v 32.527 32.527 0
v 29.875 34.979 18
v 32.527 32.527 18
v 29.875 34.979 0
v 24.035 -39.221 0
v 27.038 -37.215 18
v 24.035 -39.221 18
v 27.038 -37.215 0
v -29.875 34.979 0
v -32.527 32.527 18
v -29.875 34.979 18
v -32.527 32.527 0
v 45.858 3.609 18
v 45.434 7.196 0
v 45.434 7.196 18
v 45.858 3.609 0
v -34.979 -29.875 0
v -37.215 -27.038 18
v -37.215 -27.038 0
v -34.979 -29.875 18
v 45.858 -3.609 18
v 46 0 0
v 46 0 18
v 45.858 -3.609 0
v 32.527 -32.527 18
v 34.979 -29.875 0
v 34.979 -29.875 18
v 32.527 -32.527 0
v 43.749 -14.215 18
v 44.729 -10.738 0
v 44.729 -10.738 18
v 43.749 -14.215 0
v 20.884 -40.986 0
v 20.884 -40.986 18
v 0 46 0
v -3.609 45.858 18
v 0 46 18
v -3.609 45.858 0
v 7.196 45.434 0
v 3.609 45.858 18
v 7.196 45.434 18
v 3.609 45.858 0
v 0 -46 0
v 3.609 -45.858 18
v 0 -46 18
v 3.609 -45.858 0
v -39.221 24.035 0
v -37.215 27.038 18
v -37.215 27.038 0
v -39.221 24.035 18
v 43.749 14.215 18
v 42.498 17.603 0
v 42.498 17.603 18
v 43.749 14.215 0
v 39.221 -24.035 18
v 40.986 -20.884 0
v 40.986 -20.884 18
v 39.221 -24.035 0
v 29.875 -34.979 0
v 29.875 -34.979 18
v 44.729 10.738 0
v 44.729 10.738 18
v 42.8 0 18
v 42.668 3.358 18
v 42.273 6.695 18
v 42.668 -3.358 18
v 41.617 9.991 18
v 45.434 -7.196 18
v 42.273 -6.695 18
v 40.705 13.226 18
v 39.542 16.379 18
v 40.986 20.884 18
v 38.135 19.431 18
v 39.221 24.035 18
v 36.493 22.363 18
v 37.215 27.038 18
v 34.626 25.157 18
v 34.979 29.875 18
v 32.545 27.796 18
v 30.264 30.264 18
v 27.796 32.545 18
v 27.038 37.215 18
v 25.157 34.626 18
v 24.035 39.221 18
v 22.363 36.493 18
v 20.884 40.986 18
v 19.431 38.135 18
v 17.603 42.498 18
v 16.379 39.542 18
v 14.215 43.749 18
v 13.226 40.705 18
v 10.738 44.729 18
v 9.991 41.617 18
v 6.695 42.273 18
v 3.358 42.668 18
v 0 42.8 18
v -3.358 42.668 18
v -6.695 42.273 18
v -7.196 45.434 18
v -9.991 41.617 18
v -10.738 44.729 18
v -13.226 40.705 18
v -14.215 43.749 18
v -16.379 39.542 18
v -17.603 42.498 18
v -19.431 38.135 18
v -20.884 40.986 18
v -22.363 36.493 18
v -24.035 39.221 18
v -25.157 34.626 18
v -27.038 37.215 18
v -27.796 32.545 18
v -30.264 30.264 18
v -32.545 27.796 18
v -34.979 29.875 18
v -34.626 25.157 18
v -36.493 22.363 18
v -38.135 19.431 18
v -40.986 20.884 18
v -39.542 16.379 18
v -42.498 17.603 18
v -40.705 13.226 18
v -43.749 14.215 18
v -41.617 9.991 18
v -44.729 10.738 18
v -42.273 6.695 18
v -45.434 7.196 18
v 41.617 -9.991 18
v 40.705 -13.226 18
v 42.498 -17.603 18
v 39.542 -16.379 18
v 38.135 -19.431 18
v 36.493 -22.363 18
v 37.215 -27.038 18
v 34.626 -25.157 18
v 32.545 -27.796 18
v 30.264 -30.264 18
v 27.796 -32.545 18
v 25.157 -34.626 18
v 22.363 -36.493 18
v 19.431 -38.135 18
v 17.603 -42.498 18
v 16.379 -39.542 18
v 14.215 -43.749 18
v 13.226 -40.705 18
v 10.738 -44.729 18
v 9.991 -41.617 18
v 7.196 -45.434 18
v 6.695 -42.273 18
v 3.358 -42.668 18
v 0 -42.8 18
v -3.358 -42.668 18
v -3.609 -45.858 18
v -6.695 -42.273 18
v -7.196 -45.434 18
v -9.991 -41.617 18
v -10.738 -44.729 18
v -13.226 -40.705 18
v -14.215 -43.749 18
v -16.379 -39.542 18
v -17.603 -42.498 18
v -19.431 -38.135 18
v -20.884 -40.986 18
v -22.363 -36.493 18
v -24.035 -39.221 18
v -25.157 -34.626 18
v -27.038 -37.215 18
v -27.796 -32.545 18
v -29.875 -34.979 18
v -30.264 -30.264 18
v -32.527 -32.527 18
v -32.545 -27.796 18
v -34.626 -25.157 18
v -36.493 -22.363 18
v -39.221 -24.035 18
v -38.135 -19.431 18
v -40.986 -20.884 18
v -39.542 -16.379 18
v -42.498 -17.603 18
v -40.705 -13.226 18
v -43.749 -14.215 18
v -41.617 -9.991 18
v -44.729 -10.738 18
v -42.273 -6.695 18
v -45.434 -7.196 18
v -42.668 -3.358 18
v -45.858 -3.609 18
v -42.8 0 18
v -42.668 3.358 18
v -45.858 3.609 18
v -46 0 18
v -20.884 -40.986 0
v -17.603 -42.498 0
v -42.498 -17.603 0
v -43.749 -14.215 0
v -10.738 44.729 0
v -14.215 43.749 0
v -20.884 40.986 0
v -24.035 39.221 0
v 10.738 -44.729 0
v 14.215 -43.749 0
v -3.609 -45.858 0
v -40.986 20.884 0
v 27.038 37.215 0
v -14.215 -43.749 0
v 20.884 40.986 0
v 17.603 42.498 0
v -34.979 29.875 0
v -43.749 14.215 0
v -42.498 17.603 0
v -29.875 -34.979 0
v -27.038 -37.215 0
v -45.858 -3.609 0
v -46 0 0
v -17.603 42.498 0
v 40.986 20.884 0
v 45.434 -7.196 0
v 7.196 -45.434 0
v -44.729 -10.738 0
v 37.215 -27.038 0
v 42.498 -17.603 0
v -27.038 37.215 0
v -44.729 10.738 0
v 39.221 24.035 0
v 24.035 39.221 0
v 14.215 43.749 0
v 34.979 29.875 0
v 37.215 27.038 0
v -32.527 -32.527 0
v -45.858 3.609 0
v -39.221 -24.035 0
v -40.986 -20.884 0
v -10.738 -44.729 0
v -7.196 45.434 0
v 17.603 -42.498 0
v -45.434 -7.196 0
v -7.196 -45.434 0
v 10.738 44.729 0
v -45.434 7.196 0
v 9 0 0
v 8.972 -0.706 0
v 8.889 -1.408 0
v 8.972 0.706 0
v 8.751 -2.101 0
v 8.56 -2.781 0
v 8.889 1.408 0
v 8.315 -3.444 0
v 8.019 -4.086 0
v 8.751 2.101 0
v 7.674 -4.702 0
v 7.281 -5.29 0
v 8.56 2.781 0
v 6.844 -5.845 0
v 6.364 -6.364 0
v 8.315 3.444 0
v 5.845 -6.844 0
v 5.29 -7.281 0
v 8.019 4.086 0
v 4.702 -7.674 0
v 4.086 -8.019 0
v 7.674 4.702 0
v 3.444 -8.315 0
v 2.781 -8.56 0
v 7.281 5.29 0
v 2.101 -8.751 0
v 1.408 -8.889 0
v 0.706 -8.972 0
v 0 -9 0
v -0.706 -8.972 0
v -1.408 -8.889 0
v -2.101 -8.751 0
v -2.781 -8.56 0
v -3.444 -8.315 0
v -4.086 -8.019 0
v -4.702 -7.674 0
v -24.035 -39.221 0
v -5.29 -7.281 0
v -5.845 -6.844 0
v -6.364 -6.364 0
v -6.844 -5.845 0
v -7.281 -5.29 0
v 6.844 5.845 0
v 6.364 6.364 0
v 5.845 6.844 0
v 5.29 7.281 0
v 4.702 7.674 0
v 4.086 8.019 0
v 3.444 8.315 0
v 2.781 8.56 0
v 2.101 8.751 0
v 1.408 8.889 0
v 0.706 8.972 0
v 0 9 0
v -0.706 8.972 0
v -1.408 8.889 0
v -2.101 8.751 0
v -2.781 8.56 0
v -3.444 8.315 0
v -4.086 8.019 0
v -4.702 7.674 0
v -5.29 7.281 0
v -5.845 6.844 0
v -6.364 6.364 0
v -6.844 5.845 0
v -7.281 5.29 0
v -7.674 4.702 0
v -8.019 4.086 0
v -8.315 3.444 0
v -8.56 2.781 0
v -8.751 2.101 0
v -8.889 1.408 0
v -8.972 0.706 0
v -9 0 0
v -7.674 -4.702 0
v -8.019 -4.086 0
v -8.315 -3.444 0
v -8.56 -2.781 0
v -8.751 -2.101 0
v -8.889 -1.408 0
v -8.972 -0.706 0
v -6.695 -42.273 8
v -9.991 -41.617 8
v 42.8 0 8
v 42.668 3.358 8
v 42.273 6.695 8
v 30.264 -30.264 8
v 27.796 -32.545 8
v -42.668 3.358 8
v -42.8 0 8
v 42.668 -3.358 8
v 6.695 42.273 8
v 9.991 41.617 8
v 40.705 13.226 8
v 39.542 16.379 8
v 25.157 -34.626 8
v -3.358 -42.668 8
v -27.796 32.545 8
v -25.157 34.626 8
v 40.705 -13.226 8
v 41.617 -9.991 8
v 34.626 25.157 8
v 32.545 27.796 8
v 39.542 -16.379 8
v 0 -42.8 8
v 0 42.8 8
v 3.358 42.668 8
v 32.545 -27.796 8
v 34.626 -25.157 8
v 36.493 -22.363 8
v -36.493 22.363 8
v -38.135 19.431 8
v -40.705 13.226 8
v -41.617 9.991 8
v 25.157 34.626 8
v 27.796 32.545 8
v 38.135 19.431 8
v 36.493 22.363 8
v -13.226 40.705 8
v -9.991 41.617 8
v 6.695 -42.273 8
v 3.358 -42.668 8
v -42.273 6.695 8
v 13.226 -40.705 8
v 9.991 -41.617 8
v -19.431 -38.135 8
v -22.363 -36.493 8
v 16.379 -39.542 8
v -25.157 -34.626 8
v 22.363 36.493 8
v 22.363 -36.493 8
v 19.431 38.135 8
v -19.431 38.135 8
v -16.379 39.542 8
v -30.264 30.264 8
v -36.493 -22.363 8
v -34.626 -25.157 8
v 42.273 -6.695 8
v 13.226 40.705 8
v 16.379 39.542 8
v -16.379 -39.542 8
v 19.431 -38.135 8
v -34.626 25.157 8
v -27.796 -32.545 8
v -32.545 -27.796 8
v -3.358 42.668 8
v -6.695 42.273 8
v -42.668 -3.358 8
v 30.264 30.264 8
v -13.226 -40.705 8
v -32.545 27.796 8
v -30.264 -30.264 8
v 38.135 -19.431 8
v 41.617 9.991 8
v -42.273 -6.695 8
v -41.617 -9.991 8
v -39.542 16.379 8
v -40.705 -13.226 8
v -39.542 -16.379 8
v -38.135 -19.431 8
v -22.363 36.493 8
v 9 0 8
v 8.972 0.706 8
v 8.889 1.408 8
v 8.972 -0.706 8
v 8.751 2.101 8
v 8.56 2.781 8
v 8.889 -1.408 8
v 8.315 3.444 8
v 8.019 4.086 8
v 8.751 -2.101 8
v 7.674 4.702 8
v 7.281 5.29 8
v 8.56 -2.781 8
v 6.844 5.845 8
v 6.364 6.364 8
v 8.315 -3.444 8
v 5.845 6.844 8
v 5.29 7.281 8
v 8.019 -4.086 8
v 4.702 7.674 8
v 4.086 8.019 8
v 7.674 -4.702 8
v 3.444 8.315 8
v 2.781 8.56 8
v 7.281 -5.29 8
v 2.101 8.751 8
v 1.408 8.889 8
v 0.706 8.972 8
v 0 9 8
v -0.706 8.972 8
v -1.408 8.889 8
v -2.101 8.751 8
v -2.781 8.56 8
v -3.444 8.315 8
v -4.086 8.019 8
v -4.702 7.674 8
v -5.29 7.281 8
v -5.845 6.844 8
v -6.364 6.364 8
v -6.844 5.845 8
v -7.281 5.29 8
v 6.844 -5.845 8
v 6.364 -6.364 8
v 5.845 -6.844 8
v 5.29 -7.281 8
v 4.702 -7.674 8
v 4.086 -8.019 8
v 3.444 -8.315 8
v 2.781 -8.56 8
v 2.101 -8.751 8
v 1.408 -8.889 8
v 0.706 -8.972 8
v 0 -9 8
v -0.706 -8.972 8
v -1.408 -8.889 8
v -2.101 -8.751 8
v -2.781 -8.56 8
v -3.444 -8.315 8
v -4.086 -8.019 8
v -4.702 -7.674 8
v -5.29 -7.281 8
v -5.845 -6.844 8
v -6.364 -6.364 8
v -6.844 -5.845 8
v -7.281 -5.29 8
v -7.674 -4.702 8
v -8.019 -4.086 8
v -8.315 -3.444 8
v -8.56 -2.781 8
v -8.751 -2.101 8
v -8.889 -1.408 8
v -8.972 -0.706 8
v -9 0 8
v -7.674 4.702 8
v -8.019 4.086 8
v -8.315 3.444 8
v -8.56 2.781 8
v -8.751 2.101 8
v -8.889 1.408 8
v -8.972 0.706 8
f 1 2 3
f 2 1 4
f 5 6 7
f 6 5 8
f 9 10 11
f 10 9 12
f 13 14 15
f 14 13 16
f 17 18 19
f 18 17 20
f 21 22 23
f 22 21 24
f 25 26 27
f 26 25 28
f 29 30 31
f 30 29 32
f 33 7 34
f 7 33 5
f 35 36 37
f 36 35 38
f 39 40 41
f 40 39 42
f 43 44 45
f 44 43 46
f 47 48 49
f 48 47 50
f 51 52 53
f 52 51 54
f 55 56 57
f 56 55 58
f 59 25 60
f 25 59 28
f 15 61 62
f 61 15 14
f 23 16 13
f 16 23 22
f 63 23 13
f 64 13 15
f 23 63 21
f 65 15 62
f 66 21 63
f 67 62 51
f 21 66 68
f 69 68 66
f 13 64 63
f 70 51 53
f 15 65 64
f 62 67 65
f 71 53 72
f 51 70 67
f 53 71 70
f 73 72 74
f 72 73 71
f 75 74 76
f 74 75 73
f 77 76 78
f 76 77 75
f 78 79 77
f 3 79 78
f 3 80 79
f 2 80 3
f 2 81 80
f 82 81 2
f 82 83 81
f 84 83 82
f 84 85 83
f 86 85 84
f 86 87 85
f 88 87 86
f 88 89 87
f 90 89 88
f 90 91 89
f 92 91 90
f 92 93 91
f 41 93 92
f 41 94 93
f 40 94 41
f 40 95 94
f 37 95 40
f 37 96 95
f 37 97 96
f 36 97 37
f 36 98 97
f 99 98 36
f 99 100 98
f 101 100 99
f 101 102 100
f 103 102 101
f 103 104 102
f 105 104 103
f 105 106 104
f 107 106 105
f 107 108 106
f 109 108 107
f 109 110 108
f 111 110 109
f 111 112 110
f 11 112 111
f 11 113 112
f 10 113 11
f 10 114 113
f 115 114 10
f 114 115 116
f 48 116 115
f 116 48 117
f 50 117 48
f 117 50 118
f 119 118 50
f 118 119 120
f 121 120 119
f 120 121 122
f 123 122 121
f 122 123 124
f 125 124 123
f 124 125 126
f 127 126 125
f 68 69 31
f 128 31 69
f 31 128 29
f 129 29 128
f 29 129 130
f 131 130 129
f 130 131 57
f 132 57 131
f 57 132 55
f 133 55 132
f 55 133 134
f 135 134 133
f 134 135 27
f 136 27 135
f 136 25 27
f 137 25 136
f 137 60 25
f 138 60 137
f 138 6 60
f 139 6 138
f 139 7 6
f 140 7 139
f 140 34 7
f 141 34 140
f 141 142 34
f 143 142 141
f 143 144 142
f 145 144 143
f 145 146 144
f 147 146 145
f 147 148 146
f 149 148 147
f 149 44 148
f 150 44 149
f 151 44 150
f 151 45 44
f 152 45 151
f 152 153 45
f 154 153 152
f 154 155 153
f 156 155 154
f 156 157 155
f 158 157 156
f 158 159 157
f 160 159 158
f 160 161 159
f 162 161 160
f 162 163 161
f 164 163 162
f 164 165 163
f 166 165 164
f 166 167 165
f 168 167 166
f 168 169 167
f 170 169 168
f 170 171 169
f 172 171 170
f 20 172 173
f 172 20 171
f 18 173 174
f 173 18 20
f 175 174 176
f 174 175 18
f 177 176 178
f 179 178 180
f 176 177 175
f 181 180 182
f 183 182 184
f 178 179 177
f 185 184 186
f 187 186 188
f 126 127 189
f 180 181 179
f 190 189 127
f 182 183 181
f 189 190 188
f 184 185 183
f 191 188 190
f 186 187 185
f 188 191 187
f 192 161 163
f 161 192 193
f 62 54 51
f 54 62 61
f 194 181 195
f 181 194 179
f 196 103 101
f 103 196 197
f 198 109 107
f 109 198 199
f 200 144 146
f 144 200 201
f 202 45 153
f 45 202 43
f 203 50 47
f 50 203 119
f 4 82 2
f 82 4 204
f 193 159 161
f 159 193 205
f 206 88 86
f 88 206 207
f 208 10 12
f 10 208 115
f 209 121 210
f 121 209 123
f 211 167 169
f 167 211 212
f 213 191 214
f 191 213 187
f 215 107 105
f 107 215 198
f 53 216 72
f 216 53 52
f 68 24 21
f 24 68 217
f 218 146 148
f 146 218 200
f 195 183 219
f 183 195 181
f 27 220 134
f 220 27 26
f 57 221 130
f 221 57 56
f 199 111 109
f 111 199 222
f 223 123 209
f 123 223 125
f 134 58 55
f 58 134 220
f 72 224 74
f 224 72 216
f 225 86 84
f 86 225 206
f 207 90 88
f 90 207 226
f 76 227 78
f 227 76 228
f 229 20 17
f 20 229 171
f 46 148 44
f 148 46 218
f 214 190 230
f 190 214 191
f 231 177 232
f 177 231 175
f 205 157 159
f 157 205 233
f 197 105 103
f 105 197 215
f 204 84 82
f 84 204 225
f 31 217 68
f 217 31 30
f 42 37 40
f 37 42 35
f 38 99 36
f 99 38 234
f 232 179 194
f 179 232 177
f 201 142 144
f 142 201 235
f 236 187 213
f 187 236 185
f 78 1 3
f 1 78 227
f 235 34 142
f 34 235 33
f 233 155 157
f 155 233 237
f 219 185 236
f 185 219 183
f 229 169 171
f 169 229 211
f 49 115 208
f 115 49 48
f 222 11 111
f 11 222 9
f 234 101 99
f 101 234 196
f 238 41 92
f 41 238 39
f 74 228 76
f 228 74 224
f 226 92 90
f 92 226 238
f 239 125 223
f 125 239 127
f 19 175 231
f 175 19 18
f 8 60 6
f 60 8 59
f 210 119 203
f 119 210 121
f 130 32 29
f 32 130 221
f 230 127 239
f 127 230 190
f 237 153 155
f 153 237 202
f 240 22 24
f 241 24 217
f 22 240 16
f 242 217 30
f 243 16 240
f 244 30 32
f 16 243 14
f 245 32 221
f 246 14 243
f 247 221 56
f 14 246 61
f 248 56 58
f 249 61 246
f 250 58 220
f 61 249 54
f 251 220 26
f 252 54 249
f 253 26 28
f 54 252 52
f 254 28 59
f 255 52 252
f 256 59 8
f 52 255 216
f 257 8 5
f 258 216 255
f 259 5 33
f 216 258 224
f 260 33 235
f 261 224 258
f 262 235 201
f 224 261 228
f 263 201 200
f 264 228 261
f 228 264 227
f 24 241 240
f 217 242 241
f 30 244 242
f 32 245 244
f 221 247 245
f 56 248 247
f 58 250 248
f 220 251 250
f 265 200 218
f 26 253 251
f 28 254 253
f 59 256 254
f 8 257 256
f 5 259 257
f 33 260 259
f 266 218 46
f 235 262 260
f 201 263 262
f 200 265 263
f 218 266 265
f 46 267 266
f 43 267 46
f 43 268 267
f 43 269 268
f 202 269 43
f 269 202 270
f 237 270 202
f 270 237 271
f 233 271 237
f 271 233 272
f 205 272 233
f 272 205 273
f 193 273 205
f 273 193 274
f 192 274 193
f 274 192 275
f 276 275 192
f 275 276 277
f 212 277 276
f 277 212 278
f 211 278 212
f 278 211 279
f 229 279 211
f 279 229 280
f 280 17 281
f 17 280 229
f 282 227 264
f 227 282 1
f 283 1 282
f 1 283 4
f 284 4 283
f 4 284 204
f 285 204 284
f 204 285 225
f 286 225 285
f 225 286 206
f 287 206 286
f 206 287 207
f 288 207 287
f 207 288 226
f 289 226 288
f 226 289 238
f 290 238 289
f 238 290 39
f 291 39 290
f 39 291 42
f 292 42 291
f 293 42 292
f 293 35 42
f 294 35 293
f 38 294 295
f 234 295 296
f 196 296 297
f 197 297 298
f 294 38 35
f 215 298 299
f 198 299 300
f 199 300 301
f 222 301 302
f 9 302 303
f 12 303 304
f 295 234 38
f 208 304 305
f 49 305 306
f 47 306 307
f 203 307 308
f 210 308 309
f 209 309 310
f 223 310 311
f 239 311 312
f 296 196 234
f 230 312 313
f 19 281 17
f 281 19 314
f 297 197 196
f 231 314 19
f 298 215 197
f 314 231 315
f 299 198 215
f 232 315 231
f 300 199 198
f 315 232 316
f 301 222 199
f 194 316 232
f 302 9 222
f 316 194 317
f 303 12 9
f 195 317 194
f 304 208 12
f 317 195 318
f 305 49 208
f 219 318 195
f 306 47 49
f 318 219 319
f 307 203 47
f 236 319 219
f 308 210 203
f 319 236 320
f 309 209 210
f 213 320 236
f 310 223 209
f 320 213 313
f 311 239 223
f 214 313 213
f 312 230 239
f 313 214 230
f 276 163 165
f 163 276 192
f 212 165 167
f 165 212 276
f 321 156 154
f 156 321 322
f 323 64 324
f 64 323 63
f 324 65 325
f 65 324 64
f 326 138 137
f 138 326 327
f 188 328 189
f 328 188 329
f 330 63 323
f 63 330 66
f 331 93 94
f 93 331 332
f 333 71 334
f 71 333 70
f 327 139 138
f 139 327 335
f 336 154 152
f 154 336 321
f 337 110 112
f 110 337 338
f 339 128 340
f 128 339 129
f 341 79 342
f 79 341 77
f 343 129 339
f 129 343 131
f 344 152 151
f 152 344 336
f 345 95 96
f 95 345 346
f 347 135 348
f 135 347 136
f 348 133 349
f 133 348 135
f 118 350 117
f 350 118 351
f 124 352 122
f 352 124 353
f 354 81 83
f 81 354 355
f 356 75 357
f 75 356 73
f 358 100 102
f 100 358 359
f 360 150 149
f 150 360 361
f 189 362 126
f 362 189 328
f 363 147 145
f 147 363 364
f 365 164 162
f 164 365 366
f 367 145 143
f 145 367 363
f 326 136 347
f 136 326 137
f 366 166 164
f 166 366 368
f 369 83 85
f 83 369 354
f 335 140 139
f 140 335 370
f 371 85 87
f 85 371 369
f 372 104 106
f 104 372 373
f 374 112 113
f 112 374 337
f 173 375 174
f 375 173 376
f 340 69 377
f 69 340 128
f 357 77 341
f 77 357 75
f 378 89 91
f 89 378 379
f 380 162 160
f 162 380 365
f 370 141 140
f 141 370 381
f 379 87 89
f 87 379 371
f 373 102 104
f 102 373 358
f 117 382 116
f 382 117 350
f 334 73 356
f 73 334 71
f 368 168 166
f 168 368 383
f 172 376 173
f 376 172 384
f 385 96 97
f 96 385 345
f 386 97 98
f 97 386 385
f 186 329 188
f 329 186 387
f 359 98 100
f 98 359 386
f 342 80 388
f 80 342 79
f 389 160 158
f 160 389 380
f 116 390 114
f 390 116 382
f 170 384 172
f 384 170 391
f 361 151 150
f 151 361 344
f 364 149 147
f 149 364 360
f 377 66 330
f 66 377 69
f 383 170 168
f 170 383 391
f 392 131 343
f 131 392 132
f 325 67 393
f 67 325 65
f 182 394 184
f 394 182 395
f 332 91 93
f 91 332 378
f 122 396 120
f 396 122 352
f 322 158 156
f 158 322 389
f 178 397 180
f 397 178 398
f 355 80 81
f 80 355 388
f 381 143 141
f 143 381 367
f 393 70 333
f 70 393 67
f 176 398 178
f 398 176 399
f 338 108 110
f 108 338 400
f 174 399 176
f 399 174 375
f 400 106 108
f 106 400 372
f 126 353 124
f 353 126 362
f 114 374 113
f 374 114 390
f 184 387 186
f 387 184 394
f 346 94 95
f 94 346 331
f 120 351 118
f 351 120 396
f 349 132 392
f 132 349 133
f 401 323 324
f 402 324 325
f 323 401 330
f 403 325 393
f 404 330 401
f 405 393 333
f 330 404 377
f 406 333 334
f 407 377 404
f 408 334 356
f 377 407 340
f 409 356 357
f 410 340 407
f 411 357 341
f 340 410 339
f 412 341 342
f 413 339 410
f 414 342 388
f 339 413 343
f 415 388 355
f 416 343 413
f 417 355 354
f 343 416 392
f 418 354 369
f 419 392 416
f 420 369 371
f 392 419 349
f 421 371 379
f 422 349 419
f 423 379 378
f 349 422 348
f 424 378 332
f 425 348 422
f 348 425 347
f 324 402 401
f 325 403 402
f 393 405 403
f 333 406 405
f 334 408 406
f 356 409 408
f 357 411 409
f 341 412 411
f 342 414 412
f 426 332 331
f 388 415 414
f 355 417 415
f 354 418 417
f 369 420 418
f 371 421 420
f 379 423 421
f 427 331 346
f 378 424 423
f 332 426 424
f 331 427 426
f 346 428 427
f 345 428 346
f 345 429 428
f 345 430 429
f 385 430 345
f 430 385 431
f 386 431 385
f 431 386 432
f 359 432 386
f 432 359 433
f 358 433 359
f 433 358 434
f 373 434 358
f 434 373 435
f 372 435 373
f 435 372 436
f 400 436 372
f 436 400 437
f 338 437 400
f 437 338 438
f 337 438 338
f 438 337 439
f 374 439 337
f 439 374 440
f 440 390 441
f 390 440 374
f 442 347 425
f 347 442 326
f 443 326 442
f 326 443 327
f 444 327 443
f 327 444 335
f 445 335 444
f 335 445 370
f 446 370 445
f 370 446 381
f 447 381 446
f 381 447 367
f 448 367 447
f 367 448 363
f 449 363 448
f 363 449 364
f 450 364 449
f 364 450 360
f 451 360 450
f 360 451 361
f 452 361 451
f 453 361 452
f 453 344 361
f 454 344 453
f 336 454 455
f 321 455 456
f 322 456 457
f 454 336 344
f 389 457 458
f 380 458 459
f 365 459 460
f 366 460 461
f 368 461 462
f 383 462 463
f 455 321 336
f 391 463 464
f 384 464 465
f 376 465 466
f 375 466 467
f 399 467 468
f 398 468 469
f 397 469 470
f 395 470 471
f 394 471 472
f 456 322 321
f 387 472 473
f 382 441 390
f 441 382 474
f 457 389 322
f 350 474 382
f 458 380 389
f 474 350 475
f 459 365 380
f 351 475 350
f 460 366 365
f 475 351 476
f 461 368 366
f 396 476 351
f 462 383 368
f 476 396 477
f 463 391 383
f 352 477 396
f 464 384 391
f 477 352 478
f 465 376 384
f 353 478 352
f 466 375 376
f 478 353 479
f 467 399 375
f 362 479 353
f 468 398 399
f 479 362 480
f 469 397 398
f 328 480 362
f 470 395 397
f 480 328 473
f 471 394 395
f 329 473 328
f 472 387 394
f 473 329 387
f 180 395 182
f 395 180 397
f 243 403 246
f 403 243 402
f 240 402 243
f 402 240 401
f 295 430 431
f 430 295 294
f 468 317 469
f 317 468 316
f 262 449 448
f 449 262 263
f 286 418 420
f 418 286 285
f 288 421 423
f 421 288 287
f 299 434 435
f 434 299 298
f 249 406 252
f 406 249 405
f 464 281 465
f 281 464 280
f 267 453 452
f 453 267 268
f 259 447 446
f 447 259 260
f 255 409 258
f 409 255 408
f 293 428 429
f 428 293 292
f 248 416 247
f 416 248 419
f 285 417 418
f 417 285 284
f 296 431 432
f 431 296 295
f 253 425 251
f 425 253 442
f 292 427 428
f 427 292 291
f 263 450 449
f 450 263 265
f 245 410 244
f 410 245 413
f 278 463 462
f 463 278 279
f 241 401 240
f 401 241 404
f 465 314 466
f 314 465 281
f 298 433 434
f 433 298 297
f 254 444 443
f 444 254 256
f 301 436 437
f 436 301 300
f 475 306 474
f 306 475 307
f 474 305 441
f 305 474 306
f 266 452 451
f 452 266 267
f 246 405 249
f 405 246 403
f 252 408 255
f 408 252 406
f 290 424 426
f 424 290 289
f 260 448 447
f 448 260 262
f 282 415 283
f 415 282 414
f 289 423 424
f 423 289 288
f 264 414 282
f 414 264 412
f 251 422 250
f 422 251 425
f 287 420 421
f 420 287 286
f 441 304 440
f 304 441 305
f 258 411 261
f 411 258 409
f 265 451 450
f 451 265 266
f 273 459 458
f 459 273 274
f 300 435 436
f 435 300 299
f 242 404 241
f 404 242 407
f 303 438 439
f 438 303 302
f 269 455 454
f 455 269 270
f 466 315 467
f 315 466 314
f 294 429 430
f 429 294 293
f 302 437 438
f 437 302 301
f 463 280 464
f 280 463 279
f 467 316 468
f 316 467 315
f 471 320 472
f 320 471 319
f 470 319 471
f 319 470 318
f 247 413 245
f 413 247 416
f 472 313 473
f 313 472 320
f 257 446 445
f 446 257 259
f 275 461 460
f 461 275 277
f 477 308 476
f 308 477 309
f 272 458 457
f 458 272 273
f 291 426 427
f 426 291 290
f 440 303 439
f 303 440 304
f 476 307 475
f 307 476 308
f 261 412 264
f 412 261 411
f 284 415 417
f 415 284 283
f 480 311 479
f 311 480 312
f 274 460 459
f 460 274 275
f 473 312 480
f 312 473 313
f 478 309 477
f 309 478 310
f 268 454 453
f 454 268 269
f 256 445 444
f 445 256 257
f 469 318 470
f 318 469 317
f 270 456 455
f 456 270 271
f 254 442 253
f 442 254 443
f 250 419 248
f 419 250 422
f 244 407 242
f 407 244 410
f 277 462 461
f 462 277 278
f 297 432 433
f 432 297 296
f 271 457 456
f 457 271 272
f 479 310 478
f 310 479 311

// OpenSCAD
// Cherry Pit Lid v002 - cleaner geometry, no z-fighting
// Sits on standard coffee mug ~85mm outer rim diameter

$fn = 80;

mug_od      = 85;    // mug outer rim diameter
clearance   = 0.6;   // fit clearance over rim
wall        = 3.5;   // lid wall thickness
rim_depth   = 10;    // how deep the collar drops over the mug rim
lid_thick   = 8;     // total height of the lid top section
pit_hole_d  = 18;    // center hole for cherry pit
bowl_r      = 22;    // radius of finger bowl recess
bowl_depth  = 5;     // depth of bowl recess

outer_d = mug_od + wall * 2;

difference() {
    // Solid outer shell: collar + lid top as one piece
    cylinder(d = outer_d, h = rim_depth + lid_thick);

    // Bore out the inside of the collar (fits over mug rim)
    translate([0, 0, lid_thick])
        cylinder(d = mug_od + clearance, h = rim_depth + 1);

    // Bowl recess on top: a sphere segment cut into the top face
    translate([0, 0, rim_depth + lid_thick + bowl_r - bowl_depth])
        sphere(r = bowl_r);

    // Pit hole straight through the center
    cylinder(d = pit_hole_d, h = rim_depth + lid_thick + 1);
}
